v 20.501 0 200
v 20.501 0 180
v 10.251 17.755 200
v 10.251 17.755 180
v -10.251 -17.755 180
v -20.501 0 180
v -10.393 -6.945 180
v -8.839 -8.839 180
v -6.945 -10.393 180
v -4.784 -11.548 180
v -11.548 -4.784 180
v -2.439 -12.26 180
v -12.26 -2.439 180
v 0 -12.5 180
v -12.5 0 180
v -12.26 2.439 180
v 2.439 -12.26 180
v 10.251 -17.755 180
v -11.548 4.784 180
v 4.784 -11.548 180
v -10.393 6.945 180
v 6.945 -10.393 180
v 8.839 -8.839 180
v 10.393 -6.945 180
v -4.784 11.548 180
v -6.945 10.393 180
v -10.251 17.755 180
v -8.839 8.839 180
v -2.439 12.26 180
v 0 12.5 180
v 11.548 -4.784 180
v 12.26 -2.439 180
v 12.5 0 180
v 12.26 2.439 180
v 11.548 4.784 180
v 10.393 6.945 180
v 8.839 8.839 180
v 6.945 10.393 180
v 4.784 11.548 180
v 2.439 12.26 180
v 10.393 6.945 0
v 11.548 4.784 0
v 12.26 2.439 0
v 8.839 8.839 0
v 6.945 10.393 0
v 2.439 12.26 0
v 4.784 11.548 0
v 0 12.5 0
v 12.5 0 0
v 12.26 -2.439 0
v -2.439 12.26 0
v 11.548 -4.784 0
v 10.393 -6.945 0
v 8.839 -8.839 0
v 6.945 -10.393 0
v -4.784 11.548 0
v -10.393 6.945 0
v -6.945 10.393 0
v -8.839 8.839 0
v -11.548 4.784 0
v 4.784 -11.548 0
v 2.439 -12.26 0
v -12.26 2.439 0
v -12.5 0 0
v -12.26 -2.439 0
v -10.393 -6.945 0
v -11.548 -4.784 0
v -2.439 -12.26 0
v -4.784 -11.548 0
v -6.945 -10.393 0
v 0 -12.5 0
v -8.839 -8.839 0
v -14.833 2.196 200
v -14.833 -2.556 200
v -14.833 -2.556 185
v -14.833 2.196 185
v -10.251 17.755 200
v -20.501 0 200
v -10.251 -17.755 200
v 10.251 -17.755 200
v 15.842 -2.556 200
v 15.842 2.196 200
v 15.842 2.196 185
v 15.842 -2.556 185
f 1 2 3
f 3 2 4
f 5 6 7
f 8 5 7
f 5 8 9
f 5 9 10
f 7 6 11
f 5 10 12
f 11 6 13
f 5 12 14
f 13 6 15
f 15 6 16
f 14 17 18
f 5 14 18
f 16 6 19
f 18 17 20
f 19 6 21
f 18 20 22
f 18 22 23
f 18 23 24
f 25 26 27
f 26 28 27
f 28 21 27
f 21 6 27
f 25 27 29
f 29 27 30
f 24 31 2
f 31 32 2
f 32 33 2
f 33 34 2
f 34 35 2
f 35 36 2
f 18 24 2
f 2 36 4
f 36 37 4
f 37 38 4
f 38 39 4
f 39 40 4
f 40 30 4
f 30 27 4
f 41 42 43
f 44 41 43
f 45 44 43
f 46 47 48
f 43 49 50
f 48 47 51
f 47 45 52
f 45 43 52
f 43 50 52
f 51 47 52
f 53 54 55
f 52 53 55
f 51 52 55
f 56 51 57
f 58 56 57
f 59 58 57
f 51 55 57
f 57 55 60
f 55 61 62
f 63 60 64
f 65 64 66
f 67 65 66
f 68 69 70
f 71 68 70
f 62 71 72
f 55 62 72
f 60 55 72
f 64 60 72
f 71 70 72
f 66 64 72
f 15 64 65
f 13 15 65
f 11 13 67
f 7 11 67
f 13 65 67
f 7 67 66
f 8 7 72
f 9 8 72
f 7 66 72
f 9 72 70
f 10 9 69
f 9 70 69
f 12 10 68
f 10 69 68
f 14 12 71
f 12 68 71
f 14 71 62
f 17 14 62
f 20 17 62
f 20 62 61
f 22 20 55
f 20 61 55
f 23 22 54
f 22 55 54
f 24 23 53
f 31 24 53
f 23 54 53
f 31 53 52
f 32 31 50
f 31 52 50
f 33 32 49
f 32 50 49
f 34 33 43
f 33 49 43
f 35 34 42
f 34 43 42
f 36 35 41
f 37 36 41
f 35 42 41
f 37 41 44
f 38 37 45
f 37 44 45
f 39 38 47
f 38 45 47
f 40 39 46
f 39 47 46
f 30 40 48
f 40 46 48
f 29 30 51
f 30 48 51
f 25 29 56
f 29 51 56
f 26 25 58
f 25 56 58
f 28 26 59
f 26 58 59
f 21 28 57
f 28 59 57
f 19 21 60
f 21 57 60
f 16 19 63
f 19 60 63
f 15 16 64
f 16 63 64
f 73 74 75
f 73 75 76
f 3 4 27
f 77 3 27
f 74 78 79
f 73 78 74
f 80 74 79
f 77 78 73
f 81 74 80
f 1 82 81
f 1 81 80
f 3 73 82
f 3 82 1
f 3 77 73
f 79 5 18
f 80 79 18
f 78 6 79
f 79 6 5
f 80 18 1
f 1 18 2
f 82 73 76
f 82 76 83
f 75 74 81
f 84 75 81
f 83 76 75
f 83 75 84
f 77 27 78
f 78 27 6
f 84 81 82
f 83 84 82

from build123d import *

# Parameters (mm, degrees)
SKETCH1_R           = 12.5
BOSS_EXTRUDE1_DEPTH = 180
BOSS_EXTRUDE2_DEPTH = 20
SKETCH3_W           = 30.675059353
SKETCH3_H           = 4.752473984
CUT_EXTRUDE1_DEPTH  = 15


with BuildPart() as part:
    # Sketch1 → Boss-Extrude1 (new body)
    with BuildSketch(Plane.XY):
        with Locations(Location((0, 0, 0), (0, 0, 180))):
            Circle(SKETCH1_R)
    extrude(amount=BOSS_EXTRUDE1_DEPTH)

    # Sketch2 → Boss-Extrude2 (add)
    with BuildSketch(Plane.XY.offset(180)):
        Polygon((20.501198272, 0), (10.250599136, 17.754558511), (-10.250599136, 17.754558511), (-20.501198272, 0), (-10.250599136, -17.754558511), (10.250599136, -17.754558511), align=None)
    extrude(amount=BOSS_EXTRUDE2_DEPTH)

    # Sketch3 → Cut-Extrude1 (cut)
    with BuildSketch(Plane.XY.offset(200)):
        with Locations((0.504050272, -0.180017954)):
            Rectangle(SKETCH3_W, SKETCH3_H)
    extrude(amount=-CUT_EXTRUDE1_DEPTH, mode=Mode.SUBTRACT)


solid = part.part
